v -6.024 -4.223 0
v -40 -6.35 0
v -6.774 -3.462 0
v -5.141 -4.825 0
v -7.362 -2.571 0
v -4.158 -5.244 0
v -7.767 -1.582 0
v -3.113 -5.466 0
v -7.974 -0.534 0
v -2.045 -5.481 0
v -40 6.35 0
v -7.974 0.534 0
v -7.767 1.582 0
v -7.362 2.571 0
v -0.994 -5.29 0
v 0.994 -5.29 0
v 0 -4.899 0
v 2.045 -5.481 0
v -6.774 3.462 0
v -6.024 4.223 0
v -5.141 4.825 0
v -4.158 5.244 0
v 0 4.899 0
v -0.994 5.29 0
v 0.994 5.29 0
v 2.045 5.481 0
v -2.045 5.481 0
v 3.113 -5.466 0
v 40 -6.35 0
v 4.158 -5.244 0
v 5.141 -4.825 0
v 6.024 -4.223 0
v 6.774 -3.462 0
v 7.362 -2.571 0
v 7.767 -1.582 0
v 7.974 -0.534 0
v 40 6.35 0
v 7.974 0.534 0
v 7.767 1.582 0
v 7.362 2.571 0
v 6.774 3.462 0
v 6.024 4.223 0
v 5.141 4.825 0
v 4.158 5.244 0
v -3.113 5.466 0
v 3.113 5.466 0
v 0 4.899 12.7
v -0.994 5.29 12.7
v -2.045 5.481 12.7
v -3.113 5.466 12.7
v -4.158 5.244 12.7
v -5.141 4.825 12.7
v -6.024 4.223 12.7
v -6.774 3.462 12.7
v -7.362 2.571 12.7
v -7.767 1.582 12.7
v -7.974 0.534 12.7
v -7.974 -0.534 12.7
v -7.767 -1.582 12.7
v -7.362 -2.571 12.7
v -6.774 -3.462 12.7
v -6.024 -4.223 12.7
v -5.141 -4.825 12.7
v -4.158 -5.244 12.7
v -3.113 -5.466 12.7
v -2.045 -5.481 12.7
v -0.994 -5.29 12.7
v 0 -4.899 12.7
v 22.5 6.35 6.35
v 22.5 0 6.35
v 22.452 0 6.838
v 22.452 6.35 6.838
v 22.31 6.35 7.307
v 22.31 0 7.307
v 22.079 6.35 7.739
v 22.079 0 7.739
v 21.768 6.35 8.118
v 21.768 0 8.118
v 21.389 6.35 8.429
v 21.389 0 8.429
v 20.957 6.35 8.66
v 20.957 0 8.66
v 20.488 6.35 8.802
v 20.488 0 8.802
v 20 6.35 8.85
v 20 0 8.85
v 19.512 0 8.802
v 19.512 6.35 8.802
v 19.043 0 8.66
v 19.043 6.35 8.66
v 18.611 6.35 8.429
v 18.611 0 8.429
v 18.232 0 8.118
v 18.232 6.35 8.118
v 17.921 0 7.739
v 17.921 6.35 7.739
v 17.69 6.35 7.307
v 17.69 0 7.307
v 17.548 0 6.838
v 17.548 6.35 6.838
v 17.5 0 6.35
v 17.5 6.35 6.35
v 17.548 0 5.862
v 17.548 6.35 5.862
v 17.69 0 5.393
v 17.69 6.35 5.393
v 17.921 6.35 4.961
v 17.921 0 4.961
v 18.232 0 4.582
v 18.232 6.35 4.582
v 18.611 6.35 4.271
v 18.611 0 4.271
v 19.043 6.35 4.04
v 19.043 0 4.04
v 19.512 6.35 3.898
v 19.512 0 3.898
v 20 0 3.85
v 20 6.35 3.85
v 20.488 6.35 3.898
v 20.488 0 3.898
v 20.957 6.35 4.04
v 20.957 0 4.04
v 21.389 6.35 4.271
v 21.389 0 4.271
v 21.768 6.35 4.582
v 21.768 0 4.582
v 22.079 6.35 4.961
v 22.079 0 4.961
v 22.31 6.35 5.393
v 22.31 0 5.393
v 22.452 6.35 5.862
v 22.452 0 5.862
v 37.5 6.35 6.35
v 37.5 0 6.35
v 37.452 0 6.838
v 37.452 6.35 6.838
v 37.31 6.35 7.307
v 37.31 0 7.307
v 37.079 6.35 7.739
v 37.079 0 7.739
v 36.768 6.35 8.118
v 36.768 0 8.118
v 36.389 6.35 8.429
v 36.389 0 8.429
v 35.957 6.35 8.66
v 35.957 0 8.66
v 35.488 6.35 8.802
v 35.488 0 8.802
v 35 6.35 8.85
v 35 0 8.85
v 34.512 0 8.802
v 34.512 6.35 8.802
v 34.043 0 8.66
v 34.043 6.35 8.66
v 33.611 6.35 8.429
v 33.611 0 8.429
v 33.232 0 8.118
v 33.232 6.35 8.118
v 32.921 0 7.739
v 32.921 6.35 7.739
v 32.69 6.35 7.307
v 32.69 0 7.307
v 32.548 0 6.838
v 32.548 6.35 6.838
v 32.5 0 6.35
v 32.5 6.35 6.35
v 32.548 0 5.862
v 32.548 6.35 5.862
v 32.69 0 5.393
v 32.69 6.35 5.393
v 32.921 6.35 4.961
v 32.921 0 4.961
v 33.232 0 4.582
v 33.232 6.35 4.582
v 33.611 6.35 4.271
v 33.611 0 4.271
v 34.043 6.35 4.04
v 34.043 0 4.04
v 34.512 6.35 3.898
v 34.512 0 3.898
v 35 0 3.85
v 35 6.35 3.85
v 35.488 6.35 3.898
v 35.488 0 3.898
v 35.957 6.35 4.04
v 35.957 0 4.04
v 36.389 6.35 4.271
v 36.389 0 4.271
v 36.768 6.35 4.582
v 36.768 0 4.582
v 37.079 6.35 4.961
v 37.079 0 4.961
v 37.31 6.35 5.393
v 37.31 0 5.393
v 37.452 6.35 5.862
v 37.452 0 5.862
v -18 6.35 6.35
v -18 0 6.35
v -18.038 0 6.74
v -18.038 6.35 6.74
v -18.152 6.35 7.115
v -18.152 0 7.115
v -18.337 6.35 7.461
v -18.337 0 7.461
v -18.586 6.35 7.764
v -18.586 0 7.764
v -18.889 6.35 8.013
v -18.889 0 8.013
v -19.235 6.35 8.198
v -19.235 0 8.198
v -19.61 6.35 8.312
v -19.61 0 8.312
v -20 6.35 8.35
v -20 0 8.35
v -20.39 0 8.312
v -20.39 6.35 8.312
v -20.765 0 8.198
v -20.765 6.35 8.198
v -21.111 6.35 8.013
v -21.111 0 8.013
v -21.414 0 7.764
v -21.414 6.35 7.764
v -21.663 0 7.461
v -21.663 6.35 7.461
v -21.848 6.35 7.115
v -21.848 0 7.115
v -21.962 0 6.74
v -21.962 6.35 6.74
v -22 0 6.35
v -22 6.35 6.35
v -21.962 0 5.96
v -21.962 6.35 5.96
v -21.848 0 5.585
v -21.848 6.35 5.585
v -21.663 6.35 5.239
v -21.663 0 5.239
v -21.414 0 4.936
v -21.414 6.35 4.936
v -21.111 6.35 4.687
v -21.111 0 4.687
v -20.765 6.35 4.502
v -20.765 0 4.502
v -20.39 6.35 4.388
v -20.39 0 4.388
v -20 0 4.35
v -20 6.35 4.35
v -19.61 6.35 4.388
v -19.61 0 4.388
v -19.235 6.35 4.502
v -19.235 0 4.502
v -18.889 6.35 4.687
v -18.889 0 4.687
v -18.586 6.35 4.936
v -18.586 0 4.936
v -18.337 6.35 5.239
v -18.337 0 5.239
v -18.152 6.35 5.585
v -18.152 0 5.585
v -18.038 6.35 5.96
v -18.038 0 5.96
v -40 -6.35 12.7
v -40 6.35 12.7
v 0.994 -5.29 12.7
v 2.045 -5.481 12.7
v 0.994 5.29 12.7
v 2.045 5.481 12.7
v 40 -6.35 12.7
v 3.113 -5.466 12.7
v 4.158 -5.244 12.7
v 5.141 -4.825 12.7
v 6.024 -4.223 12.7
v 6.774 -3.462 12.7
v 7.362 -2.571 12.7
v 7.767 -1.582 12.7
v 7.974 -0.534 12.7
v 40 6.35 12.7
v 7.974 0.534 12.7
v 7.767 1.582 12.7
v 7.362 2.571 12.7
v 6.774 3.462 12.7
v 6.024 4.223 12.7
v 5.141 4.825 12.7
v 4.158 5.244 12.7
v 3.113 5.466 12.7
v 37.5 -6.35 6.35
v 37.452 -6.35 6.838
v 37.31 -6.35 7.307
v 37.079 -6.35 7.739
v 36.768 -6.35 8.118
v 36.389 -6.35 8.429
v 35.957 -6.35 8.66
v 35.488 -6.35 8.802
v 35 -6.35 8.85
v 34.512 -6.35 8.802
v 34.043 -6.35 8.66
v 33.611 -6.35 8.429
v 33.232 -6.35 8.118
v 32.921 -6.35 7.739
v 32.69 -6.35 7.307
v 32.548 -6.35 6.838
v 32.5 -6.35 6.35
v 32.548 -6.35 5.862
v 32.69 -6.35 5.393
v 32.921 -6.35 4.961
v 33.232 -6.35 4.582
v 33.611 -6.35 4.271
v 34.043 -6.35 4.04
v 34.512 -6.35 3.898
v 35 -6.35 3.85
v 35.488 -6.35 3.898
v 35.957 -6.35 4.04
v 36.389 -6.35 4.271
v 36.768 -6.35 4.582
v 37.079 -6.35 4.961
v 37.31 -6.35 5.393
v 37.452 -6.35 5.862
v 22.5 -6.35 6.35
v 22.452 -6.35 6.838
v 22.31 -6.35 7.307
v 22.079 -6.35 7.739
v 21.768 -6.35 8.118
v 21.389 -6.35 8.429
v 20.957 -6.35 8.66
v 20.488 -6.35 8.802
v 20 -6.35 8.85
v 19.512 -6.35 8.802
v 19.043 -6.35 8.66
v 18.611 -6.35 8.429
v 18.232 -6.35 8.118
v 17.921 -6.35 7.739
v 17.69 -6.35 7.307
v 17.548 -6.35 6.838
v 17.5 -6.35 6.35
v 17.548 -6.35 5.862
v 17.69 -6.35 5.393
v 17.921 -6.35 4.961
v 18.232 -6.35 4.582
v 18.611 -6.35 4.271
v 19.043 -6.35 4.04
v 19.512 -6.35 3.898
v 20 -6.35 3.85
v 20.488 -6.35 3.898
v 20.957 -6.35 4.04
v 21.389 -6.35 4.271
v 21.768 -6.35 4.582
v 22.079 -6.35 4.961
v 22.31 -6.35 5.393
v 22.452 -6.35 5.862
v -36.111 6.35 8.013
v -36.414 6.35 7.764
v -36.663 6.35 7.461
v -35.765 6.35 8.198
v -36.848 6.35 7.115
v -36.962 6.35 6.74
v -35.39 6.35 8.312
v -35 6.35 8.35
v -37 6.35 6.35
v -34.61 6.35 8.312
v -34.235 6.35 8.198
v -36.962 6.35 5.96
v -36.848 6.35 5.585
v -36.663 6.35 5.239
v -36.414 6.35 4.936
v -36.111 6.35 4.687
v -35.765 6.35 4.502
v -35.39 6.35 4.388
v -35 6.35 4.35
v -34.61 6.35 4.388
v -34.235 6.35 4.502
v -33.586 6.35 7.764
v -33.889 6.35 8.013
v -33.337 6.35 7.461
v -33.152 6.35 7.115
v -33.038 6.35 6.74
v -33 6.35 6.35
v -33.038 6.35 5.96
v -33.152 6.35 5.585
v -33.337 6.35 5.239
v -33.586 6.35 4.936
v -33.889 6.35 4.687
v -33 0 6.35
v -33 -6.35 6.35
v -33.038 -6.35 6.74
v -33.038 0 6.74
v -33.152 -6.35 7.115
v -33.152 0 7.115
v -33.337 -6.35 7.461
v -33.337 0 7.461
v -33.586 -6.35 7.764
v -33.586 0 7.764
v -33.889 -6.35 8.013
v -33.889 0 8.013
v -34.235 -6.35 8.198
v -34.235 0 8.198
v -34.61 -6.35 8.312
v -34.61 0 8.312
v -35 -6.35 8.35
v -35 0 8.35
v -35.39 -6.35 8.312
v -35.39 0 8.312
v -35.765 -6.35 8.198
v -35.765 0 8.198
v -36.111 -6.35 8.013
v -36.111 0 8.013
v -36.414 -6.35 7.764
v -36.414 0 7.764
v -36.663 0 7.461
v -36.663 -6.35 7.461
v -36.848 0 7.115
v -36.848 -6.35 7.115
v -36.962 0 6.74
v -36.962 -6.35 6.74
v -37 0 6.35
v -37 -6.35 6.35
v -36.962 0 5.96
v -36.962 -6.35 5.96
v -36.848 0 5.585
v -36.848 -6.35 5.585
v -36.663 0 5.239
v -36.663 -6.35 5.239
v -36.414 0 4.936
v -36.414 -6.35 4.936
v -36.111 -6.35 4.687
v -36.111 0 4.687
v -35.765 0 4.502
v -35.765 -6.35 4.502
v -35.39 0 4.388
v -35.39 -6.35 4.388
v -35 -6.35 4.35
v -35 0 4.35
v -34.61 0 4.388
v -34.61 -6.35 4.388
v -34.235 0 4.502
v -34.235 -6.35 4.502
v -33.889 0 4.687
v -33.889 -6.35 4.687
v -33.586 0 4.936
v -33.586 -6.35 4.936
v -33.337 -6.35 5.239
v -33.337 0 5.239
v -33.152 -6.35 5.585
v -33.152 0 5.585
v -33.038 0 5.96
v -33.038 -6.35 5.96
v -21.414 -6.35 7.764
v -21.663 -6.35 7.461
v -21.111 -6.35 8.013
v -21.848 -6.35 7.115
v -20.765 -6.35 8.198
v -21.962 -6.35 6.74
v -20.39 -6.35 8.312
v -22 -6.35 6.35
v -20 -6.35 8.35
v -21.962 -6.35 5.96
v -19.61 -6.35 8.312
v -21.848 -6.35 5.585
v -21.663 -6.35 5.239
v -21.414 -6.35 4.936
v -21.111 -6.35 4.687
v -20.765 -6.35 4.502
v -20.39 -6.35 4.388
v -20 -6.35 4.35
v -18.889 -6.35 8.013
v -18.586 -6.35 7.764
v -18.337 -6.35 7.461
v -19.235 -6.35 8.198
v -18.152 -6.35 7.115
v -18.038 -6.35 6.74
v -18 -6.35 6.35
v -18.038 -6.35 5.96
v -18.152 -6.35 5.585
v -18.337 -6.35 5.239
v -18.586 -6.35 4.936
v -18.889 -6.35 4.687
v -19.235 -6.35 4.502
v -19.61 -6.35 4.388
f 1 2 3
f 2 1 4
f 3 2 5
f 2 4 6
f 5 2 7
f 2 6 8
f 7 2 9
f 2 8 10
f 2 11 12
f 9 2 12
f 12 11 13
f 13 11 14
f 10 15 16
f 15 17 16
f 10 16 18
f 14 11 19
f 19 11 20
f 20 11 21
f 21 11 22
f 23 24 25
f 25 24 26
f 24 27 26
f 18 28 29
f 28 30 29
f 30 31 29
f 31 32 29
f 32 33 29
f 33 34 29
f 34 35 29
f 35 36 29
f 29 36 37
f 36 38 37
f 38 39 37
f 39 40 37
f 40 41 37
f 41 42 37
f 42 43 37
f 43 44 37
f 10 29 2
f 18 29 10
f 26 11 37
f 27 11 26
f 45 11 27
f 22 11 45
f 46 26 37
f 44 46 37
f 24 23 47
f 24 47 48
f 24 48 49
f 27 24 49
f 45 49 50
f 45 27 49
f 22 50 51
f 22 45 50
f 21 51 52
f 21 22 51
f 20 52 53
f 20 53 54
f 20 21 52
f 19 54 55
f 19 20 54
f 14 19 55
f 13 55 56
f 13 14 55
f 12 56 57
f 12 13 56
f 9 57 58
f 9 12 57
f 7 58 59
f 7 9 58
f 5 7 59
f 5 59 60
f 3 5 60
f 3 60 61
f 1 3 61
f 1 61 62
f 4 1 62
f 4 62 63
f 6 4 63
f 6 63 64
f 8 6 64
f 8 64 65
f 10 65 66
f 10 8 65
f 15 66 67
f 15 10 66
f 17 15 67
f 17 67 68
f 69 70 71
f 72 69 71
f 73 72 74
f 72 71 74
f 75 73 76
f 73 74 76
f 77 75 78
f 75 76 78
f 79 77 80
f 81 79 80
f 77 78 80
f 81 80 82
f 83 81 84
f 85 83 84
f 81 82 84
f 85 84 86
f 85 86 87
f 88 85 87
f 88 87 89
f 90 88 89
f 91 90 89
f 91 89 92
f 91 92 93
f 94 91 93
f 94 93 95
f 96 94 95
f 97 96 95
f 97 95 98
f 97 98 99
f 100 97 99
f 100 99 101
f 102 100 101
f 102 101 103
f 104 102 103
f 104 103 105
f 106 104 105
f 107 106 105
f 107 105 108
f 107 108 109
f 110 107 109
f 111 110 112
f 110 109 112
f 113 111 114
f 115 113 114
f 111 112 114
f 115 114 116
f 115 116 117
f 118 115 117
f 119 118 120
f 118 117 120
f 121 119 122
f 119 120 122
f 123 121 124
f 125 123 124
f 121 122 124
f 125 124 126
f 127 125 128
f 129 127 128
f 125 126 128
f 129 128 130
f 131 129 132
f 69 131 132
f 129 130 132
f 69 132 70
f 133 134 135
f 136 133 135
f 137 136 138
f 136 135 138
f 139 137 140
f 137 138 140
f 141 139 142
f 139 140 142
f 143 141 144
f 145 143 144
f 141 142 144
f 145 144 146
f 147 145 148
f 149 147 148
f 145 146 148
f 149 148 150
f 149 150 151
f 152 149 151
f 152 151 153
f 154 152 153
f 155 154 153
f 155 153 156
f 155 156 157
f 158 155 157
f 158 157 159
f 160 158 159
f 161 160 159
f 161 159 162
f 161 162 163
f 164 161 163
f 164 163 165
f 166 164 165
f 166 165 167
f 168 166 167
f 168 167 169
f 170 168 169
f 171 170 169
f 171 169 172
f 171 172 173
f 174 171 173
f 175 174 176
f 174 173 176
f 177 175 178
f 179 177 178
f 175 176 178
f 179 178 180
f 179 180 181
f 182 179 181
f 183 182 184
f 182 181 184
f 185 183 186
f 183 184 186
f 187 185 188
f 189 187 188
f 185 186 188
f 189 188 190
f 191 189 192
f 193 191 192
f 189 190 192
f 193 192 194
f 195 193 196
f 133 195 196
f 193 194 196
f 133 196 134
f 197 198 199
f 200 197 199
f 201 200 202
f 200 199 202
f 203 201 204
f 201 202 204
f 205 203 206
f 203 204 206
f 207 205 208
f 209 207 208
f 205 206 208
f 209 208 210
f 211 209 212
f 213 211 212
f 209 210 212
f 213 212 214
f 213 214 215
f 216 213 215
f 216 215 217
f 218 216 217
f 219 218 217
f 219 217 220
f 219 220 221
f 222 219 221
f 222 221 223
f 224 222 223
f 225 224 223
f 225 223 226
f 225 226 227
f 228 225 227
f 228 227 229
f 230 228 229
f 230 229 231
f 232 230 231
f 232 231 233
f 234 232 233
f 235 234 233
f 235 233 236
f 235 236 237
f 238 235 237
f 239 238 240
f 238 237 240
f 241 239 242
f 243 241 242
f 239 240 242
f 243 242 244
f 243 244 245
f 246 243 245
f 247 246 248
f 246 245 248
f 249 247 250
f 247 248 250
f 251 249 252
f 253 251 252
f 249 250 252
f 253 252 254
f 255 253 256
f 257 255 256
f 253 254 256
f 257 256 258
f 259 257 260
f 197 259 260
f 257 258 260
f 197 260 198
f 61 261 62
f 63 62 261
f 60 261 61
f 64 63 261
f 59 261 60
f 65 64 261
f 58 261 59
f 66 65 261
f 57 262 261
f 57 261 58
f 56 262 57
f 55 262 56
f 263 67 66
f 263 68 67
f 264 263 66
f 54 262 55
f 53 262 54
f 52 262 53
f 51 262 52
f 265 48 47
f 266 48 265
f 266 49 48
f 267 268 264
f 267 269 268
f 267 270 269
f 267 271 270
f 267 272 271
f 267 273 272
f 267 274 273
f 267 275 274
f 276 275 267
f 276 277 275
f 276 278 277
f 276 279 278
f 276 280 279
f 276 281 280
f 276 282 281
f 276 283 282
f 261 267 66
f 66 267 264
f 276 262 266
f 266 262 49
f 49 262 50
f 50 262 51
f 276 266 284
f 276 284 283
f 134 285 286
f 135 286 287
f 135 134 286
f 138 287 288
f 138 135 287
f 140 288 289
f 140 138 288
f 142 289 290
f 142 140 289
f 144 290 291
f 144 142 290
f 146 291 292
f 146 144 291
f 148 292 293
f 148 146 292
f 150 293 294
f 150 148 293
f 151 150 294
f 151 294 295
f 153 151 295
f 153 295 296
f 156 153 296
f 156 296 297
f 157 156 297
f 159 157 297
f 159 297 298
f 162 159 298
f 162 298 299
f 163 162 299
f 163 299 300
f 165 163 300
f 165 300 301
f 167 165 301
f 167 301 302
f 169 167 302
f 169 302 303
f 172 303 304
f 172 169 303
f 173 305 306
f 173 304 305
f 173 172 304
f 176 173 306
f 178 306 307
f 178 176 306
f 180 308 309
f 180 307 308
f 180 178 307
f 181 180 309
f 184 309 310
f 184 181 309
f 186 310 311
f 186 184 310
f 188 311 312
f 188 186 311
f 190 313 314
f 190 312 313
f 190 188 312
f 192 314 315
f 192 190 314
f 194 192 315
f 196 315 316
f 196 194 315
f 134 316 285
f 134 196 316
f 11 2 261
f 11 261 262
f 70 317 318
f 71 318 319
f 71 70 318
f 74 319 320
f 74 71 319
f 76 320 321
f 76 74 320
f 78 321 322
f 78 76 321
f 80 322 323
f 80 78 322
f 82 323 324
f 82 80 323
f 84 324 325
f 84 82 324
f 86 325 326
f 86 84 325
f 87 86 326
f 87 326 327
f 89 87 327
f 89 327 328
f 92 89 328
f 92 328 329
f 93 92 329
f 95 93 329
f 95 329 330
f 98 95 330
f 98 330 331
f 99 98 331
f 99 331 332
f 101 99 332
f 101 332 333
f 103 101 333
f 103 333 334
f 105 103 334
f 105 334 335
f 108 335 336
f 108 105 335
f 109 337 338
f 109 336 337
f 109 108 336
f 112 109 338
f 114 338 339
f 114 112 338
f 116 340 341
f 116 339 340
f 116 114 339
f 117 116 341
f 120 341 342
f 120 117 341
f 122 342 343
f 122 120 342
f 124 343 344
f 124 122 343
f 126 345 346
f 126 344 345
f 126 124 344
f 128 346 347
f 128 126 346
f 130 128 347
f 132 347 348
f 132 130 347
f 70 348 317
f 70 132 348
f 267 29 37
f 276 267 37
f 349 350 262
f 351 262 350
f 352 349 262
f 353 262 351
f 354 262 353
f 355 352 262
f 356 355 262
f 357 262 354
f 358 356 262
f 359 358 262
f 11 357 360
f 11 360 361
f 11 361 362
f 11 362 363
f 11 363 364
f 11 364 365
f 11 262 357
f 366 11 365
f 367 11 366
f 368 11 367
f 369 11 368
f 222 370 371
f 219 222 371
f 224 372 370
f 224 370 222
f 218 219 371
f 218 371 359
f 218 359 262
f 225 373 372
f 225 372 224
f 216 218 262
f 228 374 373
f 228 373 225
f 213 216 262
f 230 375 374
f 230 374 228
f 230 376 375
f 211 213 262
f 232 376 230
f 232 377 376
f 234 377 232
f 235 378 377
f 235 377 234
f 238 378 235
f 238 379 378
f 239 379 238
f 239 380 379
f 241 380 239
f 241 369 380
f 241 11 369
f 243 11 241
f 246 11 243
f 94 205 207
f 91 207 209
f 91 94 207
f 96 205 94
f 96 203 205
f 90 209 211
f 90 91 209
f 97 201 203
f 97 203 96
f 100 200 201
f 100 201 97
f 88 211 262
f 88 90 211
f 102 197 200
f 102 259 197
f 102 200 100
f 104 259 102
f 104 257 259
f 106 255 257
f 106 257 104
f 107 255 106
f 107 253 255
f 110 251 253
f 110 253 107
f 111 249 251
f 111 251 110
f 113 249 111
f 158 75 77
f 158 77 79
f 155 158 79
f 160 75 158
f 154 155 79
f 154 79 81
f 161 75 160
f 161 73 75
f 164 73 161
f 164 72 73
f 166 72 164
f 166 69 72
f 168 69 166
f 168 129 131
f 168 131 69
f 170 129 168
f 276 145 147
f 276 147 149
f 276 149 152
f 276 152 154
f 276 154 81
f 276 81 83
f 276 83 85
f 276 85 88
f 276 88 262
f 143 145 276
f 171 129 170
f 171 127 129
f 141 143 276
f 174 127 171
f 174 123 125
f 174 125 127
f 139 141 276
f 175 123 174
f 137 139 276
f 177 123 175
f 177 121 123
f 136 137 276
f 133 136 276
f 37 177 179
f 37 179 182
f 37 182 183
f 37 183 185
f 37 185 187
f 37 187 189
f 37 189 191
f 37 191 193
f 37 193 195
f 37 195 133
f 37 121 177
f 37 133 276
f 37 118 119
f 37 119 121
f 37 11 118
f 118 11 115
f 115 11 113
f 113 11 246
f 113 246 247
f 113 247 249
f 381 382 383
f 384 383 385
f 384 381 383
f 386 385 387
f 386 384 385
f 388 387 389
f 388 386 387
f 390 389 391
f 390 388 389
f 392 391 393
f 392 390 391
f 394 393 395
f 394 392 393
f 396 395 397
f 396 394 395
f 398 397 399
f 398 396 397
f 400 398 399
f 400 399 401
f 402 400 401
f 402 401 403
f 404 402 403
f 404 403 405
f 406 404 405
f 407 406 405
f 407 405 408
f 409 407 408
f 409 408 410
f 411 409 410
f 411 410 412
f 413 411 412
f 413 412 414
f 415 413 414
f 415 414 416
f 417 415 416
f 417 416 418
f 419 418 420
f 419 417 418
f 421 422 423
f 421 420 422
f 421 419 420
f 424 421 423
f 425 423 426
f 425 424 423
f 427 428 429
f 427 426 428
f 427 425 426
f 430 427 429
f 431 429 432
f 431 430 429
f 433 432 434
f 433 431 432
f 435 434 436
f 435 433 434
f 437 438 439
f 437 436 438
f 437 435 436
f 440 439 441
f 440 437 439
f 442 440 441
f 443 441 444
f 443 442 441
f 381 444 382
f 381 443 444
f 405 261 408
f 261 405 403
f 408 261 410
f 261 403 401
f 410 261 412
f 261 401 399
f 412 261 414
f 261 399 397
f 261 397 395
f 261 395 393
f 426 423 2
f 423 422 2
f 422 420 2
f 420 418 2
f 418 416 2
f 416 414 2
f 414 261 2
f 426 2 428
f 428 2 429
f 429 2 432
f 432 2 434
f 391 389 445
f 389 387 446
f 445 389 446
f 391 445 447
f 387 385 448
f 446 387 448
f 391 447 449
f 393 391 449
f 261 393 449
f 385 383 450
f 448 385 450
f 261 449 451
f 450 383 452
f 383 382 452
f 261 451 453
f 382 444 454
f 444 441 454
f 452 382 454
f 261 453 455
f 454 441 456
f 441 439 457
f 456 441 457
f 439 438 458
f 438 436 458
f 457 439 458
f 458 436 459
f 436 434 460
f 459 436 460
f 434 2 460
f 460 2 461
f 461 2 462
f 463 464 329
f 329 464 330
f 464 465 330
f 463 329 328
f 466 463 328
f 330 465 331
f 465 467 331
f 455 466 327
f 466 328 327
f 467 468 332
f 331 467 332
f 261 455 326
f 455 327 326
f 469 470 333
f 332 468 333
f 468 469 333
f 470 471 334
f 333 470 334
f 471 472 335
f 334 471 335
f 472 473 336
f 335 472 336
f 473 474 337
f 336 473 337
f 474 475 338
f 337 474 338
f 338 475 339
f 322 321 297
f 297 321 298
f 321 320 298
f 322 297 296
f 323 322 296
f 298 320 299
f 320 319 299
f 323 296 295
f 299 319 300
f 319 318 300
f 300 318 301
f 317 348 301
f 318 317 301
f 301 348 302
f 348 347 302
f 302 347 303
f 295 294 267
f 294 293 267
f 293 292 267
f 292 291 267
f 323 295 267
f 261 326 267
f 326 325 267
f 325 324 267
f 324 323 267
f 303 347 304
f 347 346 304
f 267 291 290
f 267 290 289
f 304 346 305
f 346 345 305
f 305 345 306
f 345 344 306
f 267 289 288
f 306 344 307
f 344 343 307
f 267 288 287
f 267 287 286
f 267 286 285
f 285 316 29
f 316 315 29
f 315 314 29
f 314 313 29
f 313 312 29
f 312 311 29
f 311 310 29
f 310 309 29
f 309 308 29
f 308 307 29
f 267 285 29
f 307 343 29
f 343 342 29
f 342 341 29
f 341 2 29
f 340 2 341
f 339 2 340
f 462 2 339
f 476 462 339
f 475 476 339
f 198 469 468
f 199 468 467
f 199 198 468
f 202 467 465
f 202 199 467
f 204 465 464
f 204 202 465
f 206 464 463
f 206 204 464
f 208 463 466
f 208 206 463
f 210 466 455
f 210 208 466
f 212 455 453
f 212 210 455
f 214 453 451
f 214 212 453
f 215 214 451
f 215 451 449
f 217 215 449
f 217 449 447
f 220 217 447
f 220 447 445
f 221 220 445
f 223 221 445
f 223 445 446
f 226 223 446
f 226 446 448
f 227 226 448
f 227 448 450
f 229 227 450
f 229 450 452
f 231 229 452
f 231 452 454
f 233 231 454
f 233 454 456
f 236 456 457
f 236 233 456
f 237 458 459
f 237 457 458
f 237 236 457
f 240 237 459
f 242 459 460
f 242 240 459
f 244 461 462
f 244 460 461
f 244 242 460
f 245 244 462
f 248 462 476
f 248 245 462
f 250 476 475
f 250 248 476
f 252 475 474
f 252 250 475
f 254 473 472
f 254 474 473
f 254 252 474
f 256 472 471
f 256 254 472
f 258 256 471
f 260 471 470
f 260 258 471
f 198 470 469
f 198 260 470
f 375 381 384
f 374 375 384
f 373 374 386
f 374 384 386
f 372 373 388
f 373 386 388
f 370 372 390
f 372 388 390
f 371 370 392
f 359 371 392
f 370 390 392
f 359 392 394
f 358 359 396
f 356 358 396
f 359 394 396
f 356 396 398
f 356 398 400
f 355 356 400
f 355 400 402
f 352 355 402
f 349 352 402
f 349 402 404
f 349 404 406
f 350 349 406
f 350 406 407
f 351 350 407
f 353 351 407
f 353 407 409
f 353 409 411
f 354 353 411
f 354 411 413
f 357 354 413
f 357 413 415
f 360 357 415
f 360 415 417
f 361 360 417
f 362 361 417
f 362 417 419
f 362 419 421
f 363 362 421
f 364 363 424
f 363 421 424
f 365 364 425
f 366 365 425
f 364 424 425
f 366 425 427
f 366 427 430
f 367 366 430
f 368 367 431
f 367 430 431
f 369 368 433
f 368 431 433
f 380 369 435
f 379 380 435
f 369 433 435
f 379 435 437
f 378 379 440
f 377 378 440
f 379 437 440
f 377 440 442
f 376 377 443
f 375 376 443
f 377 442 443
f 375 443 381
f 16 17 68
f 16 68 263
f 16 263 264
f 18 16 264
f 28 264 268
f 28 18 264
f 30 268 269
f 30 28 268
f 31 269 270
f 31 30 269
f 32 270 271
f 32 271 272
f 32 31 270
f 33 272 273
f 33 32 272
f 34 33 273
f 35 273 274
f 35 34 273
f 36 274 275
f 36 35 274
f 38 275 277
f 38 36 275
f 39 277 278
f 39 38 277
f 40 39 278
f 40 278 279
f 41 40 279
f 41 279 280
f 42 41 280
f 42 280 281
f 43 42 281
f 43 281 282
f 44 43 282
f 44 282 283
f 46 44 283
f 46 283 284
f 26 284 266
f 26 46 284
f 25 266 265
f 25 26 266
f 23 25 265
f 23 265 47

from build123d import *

# Parameters (mm, degrees)
SKETCH_W          = 80
SKETCH_H          = 12.7
PAD_DEPTH         = 12.7
SKETCH001_R       = 2
SKETCH001_R_2     = 2.5
POCKET_DEPTH      = 6.351
POCKET_DEPTH_BACK = -6.351


with BuildPart() as part:
    # Sketch → Pad (new body)
    with BuildSketch(Plane.XY):
        Rectangle(SKETCH_W, SKETCH_H)
        with BuildLine():
            ThreePointArc((0, -4.898979), (8, 0), (0, 4.898979))
            ThreePointArc((0, 4.898979), (-8, 0), (0, -4.898979))
        make_face(mode=Mode.SUBTRACT)
    extrude(amount=PAD_DEPTH)

    # Sketch001 → Pocket (cut, two sides)
    with BuildSketch(Plane.XZ) as pocket_sk:
        with Locations((-35, 6.35)):
            Circle(SKETCH001_R)
        with Locations((-20, 6.35)):
            Circle(SKETCH001_R)
        with Locations((20, 6.35)):
            Circle(SKETCH001_R_2)
        with Locations((35, 6.35)):
            Circle(SKETCH001_R_2)
    extrude(amount=-POCKET_DEPTH, mode=Mode.SUBTRACT)
    extrude(pocket_sk.sketch, amount=-POCKET_DEPTH_BACK, mode=Mode.SUBTRACT)


solid = part.part
